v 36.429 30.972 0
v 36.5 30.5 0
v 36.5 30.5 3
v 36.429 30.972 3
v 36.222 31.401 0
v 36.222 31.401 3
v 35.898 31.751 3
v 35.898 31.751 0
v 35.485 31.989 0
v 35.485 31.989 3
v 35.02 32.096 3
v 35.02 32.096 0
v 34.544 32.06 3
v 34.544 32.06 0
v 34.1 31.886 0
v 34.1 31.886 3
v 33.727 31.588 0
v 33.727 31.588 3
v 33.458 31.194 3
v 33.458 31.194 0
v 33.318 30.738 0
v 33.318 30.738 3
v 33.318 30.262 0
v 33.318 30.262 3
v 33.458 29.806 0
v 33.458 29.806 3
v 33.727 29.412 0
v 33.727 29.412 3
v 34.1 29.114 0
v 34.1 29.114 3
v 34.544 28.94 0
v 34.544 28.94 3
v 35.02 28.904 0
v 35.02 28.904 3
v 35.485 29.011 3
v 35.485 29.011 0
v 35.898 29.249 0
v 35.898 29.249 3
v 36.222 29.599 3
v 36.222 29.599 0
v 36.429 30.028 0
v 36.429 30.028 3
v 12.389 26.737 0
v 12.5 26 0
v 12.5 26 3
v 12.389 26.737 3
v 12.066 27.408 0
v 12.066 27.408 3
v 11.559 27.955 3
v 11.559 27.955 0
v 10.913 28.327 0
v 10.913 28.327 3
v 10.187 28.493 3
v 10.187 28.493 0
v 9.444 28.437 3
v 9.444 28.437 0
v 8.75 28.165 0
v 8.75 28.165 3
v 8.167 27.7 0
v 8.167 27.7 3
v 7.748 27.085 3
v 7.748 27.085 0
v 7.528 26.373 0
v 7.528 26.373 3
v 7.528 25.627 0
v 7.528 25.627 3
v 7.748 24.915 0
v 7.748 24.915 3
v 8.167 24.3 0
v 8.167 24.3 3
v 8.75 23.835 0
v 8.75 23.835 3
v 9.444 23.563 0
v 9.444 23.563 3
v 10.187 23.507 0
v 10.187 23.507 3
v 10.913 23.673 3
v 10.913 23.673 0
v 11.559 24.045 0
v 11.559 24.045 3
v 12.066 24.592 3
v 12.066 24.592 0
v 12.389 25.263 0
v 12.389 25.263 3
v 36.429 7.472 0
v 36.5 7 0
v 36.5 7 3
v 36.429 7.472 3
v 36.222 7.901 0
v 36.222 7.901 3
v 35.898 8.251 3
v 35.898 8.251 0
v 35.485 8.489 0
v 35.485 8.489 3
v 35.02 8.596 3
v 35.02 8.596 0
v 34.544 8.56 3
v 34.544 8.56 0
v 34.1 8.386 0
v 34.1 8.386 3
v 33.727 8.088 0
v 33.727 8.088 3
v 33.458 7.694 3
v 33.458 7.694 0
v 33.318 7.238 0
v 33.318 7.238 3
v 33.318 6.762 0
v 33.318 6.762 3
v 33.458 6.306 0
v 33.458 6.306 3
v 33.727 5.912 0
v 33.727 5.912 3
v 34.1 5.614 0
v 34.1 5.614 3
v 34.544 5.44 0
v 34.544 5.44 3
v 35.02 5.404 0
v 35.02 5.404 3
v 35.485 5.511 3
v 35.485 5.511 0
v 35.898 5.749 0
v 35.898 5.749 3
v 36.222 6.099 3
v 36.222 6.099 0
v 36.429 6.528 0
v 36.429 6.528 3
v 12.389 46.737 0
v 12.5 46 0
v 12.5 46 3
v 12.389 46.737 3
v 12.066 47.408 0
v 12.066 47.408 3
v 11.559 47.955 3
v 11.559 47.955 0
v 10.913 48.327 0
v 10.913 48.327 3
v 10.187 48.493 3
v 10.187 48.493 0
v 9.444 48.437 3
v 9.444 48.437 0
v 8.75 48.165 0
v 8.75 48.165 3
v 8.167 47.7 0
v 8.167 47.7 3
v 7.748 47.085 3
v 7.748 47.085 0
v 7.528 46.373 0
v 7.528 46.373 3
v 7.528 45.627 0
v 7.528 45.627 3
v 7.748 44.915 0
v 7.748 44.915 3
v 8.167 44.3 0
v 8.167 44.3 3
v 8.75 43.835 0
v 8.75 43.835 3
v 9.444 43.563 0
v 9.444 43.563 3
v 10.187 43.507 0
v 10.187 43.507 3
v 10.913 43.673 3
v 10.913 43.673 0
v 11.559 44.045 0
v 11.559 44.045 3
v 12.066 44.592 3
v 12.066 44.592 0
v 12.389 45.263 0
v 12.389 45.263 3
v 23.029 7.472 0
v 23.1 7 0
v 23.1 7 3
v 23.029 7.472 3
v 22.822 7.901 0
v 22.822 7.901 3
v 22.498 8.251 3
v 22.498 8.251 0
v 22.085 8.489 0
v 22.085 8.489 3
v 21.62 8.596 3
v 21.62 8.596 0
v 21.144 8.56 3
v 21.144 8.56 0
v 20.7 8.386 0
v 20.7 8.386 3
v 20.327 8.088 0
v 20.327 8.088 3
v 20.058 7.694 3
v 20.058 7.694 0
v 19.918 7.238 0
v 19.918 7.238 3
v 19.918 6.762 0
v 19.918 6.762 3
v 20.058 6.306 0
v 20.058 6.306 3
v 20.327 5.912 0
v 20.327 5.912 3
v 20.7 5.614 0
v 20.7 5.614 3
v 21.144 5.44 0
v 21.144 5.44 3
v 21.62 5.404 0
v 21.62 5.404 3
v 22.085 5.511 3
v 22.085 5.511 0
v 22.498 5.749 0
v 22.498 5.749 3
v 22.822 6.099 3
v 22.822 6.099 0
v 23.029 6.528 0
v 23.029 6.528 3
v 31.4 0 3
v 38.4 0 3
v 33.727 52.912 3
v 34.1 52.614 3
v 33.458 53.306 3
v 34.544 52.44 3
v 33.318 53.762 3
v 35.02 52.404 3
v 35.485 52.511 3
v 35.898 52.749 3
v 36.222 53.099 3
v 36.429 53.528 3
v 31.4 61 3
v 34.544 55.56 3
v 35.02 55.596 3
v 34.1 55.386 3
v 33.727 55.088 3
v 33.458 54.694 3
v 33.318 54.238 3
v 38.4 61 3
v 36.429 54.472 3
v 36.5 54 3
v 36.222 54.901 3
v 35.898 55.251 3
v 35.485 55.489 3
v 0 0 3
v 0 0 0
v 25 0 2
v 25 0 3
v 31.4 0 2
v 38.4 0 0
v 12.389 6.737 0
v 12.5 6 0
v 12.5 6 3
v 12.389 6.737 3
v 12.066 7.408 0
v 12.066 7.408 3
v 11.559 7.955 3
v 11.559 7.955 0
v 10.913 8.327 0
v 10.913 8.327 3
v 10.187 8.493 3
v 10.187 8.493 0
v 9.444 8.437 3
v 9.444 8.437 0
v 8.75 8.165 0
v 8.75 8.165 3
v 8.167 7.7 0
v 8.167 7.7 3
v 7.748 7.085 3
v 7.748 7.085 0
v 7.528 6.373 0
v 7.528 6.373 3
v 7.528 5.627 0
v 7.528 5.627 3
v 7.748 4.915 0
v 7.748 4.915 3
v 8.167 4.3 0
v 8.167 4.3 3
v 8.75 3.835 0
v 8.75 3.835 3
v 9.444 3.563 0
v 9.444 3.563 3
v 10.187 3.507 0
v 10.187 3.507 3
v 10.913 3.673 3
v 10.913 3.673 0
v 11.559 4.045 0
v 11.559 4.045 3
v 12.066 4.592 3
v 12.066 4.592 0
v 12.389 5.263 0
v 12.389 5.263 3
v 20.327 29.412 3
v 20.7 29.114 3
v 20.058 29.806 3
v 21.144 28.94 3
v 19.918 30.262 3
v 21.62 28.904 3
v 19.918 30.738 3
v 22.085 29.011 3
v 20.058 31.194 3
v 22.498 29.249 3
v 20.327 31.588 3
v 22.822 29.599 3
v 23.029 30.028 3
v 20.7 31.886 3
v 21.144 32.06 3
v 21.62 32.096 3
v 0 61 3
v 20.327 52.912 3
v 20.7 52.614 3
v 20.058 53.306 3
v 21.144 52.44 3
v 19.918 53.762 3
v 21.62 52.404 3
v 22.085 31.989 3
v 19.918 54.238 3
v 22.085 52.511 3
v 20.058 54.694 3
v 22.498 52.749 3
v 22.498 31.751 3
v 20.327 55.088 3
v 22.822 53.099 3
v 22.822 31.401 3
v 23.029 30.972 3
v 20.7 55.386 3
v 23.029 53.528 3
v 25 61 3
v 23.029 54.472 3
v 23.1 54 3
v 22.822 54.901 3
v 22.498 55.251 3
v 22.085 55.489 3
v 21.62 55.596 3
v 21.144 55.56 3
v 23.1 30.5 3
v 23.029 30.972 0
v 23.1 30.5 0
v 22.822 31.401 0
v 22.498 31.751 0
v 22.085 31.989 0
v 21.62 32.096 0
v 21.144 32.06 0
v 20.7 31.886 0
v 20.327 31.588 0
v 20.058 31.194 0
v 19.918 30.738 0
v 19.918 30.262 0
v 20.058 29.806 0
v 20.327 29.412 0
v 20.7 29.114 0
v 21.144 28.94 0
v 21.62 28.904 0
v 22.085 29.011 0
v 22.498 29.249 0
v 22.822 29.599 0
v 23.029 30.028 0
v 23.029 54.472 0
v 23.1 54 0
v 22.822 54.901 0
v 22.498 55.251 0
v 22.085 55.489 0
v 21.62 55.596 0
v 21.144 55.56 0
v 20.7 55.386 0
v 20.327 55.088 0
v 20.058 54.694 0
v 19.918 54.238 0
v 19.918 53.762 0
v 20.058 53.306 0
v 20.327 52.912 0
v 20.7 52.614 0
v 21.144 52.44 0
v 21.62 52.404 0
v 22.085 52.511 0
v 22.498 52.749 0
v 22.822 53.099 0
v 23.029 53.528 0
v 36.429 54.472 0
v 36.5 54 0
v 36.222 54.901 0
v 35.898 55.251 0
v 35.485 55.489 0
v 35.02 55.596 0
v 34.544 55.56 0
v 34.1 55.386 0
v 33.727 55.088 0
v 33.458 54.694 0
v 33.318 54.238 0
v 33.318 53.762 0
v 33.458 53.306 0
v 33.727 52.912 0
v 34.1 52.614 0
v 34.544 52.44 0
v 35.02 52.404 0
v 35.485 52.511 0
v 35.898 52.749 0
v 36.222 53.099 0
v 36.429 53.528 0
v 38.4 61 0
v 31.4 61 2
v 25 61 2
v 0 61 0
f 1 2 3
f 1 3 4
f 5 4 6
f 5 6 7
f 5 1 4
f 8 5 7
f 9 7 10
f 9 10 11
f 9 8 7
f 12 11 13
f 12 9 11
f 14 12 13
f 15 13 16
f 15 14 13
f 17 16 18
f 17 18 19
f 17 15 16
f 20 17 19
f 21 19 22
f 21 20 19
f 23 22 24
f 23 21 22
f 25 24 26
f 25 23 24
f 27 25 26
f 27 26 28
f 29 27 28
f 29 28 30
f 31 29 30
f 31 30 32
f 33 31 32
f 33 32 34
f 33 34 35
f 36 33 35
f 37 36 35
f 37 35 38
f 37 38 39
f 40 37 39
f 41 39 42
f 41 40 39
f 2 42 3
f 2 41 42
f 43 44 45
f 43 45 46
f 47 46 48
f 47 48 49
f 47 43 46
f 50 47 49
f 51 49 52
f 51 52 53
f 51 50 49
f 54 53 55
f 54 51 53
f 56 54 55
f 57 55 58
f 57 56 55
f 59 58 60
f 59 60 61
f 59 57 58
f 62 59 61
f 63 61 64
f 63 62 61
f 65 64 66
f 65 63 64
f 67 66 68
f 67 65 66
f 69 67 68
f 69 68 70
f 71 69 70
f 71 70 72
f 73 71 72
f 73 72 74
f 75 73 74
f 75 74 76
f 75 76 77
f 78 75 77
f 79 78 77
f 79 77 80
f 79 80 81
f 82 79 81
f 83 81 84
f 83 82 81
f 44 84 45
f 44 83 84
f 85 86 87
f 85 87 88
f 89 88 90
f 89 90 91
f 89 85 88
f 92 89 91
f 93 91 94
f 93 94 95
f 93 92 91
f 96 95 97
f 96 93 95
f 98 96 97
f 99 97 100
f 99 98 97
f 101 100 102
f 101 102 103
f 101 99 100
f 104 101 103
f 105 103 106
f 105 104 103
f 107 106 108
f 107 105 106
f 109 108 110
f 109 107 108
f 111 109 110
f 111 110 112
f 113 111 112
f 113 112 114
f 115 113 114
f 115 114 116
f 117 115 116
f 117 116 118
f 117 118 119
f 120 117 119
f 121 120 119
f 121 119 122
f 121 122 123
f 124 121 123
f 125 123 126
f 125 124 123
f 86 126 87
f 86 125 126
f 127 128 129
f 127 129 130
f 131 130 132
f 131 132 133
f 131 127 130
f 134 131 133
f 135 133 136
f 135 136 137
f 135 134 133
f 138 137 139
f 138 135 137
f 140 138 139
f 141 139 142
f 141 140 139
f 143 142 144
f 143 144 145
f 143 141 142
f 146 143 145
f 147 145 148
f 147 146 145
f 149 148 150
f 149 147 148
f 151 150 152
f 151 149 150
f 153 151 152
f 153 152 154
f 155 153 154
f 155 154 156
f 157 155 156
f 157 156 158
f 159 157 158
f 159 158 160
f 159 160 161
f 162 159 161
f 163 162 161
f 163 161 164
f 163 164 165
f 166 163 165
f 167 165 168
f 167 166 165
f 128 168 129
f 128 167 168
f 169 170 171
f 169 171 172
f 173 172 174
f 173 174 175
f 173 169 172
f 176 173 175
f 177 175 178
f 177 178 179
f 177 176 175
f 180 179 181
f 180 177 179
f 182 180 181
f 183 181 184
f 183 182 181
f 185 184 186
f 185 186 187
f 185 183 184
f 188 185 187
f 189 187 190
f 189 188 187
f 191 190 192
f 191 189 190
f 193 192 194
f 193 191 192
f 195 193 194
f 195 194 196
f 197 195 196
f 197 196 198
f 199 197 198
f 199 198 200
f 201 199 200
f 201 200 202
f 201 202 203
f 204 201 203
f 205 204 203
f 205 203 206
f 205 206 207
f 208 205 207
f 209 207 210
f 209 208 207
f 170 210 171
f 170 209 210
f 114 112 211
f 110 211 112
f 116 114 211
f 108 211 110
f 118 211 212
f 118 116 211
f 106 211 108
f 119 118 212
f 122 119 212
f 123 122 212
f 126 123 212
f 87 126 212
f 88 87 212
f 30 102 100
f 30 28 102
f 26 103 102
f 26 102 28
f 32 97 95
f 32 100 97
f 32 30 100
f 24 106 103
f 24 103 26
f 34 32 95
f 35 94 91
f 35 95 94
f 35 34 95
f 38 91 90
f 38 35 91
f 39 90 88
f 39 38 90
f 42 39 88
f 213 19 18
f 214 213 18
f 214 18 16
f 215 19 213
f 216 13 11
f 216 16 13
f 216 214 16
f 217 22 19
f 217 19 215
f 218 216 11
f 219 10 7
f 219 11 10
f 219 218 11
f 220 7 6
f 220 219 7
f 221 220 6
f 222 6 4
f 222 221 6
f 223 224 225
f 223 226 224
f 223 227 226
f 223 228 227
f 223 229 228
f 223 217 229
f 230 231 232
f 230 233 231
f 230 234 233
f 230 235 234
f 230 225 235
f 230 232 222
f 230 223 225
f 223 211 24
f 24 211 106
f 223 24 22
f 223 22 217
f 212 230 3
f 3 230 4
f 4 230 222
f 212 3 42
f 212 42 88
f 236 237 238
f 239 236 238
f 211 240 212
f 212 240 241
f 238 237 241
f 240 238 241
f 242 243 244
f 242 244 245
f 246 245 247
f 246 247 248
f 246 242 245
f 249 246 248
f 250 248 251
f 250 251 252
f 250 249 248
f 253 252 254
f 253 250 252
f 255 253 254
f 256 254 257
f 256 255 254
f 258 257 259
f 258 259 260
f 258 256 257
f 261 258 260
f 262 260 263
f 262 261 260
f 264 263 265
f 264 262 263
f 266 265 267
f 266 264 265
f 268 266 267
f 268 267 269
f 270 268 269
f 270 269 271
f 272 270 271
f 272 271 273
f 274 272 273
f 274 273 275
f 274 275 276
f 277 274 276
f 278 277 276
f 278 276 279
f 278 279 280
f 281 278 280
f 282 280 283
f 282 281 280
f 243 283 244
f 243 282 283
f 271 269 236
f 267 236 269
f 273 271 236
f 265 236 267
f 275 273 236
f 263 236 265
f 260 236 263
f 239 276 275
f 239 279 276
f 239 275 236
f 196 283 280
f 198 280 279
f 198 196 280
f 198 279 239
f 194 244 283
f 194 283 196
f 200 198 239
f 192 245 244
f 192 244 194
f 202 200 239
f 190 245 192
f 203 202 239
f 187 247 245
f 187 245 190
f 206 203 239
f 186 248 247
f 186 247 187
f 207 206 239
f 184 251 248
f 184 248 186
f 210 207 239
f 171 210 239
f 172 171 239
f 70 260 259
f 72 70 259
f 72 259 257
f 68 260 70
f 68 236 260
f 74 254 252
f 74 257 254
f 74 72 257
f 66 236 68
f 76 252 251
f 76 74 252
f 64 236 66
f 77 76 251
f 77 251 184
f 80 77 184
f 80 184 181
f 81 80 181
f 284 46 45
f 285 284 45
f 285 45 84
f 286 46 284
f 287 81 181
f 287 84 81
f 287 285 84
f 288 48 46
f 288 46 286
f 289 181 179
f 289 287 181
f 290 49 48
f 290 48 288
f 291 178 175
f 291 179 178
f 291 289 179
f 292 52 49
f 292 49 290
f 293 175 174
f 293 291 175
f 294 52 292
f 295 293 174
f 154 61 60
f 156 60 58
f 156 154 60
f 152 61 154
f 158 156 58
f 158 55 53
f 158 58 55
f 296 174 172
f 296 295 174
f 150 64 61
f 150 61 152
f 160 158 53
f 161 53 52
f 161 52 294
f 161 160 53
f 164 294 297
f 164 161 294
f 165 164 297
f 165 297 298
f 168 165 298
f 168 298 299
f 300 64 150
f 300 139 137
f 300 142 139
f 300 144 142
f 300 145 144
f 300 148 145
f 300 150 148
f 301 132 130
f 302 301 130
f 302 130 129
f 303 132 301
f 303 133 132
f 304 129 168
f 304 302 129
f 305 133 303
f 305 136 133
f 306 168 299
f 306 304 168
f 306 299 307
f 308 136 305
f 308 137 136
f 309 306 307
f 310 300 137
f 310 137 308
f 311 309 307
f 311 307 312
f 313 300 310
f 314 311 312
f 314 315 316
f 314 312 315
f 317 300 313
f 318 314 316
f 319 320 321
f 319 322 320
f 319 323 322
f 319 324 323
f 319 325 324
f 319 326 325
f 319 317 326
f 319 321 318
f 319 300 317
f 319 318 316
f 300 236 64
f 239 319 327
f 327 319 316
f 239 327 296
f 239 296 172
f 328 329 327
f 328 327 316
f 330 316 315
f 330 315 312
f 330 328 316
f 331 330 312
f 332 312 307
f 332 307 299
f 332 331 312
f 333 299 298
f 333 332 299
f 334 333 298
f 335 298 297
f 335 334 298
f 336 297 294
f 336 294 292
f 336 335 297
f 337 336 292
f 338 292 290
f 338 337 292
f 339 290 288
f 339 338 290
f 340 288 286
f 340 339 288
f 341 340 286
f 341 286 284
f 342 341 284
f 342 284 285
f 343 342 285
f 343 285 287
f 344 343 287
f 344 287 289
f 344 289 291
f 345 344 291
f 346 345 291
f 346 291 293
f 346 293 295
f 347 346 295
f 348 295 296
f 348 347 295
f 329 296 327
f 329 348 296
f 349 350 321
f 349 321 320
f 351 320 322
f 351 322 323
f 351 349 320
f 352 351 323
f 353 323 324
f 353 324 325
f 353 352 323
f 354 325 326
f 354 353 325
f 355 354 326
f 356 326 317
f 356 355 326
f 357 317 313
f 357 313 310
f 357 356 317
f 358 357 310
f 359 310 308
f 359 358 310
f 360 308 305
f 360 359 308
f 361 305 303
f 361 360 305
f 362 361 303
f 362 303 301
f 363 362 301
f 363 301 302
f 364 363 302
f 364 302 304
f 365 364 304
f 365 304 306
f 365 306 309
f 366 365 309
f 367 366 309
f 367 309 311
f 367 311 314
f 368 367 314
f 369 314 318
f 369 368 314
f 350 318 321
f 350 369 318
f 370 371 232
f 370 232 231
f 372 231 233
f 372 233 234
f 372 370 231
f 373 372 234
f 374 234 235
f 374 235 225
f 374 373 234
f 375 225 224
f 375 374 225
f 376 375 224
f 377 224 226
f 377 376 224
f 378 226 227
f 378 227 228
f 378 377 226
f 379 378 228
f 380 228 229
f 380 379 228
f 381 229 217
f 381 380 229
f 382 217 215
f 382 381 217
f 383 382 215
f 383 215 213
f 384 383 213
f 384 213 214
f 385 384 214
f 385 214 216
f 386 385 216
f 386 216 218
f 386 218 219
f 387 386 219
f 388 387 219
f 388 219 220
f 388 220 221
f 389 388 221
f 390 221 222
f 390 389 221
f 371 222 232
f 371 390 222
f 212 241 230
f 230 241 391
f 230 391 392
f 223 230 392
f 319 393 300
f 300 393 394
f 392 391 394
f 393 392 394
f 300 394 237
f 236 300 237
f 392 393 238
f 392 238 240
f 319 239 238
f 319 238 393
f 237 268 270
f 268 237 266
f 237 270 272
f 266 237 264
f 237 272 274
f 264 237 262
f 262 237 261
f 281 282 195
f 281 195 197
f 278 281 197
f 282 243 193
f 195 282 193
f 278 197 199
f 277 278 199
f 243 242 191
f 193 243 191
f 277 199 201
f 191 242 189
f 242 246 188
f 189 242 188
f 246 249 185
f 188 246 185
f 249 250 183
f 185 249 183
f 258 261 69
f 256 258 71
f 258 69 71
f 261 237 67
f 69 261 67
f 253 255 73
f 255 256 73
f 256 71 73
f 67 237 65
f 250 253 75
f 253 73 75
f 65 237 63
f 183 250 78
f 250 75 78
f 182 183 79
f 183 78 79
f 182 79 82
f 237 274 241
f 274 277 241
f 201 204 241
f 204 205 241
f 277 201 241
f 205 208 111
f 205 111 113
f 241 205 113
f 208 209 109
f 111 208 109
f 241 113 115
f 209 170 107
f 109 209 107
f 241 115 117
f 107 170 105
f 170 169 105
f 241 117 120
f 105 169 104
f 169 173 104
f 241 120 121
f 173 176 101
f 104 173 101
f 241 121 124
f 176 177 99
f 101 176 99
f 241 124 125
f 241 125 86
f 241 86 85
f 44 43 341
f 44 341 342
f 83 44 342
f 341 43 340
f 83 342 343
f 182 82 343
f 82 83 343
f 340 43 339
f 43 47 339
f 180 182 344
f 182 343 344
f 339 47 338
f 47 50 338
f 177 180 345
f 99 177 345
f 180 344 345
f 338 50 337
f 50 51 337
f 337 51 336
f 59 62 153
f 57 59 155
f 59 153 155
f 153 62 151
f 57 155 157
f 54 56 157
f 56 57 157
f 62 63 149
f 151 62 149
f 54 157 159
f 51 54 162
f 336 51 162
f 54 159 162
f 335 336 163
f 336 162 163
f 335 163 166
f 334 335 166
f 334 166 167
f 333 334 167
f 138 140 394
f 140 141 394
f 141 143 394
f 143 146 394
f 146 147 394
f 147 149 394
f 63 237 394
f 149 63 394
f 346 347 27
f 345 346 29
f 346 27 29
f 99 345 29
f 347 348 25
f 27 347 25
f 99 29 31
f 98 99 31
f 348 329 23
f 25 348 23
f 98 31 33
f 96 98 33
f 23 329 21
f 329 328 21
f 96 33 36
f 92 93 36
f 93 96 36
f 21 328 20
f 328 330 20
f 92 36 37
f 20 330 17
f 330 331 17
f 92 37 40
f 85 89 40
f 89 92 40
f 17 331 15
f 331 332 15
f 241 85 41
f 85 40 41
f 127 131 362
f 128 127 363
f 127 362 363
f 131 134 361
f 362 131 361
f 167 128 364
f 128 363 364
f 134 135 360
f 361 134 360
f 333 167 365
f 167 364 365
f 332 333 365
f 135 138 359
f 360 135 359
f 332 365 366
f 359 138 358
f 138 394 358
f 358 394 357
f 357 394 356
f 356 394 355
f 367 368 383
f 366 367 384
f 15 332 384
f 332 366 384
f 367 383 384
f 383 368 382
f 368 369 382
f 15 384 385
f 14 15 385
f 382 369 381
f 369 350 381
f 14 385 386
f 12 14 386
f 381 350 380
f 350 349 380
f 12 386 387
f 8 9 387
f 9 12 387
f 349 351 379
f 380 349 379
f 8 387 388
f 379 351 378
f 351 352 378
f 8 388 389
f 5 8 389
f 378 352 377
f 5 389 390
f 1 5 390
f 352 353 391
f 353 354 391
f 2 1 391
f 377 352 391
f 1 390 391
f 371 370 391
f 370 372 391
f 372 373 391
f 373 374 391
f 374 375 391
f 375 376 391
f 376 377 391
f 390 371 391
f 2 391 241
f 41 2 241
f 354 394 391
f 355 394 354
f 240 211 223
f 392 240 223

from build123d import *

# Parameters (mm, degrees)
SKETCH_R     = 2.5
SKETCH_R_2   = 1.6
PAD_DEPTH    = 3
SKETCH001_W  = 6.4
SKETCH001_H  = 103.817123
POCKET_DEPTH = 1


with BuildPart() as part:
    # Sketch → Pad (new body)
    with BuildSketch(Plane.XY):
        Polygon((0, 0), (38.400002, 0), (38.4, 61), (0, 61), align=None)
        with Locations((10, 46)):
            Circle(SKETCH_R, mode=Mode.SUBTRACT)
        with Locations((10, 26)):
            Circle(SKETCH_R, mode=Mode.SUBTRACT)
        with Locations((10, 6)):
            Circle(SKETCH_R, mode=Mode.SUBTRACT)
        with Locations((21.5, 54)):
            Circle(SKETCH_R_2, mode=Mode.SUBTRACT)
        with Locations((21.5, 7)):
            Circle(SKETCH_R_2, mode=Mode.SUBTRACT)
        with Locations((34.900002, 7)):
            Circle(SKETCH_R_2, mode=Mode.SUBTRACT)
        with Locations((34.900002, 54)):
            Circle(SKETCH_R_2, mode=Mode.SUBTRACT)
        with Locations((34.900002, 30.5)):
            Circle(SKETCH_R_2, mode=Mode.SUBTRACT)
        with Locations((21.5, 30.5)):
            Circle(SKETCH_R_2, mode=Mode.SUBTRACT)
    extrude(amount=PAD_DEPTH)

    # Sketch001 (on Face15 of Pad) → Pocket (cut)
    with BuildSketch(Plane.XY.offset(3)):
        with Locations((28.2, 19.77481)):
            Rectangle(SKETCH001_W, SKETCH001_H)
    extrude(amount=-POCKET_DEPTH, mode=Mode.SUBTRACT)


solid = part.part
